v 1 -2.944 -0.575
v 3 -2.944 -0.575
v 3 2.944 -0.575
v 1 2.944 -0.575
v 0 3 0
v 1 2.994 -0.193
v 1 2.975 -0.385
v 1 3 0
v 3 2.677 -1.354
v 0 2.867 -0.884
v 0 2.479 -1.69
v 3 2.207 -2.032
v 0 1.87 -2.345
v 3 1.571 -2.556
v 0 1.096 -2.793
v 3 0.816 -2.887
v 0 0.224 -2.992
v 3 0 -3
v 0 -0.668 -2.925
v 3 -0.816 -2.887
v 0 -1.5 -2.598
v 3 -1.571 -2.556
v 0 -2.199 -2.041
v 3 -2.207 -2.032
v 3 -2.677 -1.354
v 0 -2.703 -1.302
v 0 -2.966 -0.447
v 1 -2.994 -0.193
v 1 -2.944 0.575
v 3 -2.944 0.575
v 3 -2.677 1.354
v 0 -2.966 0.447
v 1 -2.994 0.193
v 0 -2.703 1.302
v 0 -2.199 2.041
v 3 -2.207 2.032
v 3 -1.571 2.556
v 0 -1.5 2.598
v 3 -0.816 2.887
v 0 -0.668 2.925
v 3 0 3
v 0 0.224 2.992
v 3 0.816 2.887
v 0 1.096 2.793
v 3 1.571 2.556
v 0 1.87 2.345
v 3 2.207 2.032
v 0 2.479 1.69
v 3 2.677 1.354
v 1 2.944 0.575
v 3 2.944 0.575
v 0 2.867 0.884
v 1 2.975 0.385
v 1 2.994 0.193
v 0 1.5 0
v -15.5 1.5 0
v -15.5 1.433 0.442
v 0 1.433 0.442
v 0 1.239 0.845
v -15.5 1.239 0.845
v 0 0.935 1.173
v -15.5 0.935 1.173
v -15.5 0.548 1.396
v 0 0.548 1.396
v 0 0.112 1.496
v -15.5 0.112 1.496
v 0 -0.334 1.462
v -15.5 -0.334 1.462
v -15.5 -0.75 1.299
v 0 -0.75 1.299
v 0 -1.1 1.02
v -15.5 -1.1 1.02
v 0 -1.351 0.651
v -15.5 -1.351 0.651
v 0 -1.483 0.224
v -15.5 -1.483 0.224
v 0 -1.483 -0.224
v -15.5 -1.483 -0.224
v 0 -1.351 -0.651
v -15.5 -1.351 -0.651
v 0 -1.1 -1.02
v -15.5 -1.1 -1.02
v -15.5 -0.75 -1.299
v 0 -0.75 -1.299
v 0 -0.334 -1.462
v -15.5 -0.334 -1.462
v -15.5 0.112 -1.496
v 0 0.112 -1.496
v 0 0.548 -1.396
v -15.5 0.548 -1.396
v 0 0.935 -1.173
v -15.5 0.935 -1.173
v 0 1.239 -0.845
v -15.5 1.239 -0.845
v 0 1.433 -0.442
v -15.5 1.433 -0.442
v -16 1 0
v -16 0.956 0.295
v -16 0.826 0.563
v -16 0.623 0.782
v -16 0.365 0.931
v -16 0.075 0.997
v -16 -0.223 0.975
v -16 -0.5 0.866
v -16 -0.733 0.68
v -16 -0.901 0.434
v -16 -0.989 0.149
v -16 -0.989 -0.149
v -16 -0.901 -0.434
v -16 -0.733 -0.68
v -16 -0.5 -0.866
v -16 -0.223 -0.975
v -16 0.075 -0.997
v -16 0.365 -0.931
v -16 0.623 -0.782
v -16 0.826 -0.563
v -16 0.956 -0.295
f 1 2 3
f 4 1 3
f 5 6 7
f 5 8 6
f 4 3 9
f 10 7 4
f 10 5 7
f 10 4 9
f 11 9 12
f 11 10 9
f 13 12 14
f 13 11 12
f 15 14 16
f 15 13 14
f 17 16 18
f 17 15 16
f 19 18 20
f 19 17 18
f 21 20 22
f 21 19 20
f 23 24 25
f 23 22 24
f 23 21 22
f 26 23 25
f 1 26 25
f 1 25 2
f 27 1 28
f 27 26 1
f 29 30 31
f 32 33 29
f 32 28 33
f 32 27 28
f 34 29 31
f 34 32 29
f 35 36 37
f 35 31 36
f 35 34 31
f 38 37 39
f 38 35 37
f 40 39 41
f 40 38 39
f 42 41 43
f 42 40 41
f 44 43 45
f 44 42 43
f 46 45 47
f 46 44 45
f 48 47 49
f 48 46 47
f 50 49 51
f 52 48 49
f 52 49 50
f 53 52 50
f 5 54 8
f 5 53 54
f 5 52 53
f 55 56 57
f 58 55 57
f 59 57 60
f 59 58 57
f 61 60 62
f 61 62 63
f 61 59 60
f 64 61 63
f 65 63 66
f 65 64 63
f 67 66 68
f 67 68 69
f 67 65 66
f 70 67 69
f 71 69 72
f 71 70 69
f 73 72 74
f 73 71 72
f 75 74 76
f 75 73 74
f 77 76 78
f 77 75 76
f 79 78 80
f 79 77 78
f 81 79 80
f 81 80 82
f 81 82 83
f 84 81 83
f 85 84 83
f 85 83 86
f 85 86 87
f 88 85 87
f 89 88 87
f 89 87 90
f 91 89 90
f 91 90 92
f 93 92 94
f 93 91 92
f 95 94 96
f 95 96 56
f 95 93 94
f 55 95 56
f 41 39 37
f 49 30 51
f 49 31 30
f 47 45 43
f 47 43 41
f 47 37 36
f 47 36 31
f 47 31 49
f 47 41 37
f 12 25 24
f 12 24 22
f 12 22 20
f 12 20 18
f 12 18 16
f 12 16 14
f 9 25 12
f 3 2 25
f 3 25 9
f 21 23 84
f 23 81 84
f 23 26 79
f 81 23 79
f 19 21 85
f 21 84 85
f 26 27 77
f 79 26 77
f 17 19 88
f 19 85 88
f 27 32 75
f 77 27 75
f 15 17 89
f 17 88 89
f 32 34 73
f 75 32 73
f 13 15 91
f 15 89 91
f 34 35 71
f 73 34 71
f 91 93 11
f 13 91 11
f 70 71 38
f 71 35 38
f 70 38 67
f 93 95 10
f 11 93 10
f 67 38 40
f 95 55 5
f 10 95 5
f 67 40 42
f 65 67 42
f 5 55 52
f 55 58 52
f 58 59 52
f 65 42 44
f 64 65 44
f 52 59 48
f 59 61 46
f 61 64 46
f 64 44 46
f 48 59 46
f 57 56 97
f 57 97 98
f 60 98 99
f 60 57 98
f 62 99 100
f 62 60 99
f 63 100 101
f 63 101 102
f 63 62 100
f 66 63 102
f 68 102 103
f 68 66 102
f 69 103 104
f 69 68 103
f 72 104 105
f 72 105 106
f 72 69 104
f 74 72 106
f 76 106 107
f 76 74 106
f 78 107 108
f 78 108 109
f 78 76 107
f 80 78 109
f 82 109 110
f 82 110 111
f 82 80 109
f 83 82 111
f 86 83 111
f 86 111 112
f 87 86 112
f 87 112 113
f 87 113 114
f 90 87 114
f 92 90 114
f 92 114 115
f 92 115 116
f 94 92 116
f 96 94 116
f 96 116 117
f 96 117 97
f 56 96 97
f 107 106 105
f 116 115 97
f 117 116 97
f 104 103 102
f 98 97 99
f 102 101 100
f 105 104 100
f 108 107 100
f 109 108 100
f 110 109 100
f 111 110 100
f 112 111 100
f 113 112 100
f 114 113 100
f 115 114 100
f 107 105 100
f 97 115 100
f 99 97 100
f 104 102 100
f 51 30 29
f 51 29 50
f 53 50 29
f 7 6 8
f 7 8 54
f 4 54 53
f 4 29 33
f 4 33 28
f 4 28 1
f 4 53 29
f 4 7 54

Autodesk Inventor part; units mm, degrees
ref_plane "YZ Plane" through (0, 0, 0) normal (1, 0, 0) x (0, 1, 0)
ref_plane "XZ Plane" through (0, 0, 0) normal (0, 1, 0) x (-1, 0, 0)
ref_plane "XY Plane" through (0, 0, 0) normal (0, 0, 1) x (1, 0, 0)
sketch "Sketch1" plane through (0, 0, 0) normal (1, 0, 0) x (0, 1, 0)
  circle A0 centre (0, 0) radius 1.5
  circle A1 centre (0, 0) radius 3
  dimension "d0" = 3
  dimension "d1" = 6
extrude "Extrusion1" add sketch "Sketch1" against normal blind 16 contours A0
extrude "Extrusion2" add sketch "Sketch1" along normal blind 3 contours A0 | A1
sketch "Sketch2" plane through (3, 0, 0) normal (1, 0, 0) x (0, 0, -1)
  circle A0 centre (0, 0) radius 3 projected
  circle A1 centre (0, 0) radius 3 projected
  line L0 (-0.5749, -2.9444) -> (-0.5749, 2.9444)
  line L1 (0.5749, -2.9444) -> (0.5749, 2.9444)
  line L2 (0, 0) -> (0, 3)
extrude "Extrusion3" cut sketch "Sketch2" against normal blind 2 contours L1 A0 L0
chamfer "Chamfer1" distance 0.5 angle 45 1 edges at (-16, -1.5, 0)
thread "Thread2" size "M3x0.5" class "6g" standard "ANSI Metric M Profile" full length
properties part number "screw_M3-10" material "Сталь, легированная"
